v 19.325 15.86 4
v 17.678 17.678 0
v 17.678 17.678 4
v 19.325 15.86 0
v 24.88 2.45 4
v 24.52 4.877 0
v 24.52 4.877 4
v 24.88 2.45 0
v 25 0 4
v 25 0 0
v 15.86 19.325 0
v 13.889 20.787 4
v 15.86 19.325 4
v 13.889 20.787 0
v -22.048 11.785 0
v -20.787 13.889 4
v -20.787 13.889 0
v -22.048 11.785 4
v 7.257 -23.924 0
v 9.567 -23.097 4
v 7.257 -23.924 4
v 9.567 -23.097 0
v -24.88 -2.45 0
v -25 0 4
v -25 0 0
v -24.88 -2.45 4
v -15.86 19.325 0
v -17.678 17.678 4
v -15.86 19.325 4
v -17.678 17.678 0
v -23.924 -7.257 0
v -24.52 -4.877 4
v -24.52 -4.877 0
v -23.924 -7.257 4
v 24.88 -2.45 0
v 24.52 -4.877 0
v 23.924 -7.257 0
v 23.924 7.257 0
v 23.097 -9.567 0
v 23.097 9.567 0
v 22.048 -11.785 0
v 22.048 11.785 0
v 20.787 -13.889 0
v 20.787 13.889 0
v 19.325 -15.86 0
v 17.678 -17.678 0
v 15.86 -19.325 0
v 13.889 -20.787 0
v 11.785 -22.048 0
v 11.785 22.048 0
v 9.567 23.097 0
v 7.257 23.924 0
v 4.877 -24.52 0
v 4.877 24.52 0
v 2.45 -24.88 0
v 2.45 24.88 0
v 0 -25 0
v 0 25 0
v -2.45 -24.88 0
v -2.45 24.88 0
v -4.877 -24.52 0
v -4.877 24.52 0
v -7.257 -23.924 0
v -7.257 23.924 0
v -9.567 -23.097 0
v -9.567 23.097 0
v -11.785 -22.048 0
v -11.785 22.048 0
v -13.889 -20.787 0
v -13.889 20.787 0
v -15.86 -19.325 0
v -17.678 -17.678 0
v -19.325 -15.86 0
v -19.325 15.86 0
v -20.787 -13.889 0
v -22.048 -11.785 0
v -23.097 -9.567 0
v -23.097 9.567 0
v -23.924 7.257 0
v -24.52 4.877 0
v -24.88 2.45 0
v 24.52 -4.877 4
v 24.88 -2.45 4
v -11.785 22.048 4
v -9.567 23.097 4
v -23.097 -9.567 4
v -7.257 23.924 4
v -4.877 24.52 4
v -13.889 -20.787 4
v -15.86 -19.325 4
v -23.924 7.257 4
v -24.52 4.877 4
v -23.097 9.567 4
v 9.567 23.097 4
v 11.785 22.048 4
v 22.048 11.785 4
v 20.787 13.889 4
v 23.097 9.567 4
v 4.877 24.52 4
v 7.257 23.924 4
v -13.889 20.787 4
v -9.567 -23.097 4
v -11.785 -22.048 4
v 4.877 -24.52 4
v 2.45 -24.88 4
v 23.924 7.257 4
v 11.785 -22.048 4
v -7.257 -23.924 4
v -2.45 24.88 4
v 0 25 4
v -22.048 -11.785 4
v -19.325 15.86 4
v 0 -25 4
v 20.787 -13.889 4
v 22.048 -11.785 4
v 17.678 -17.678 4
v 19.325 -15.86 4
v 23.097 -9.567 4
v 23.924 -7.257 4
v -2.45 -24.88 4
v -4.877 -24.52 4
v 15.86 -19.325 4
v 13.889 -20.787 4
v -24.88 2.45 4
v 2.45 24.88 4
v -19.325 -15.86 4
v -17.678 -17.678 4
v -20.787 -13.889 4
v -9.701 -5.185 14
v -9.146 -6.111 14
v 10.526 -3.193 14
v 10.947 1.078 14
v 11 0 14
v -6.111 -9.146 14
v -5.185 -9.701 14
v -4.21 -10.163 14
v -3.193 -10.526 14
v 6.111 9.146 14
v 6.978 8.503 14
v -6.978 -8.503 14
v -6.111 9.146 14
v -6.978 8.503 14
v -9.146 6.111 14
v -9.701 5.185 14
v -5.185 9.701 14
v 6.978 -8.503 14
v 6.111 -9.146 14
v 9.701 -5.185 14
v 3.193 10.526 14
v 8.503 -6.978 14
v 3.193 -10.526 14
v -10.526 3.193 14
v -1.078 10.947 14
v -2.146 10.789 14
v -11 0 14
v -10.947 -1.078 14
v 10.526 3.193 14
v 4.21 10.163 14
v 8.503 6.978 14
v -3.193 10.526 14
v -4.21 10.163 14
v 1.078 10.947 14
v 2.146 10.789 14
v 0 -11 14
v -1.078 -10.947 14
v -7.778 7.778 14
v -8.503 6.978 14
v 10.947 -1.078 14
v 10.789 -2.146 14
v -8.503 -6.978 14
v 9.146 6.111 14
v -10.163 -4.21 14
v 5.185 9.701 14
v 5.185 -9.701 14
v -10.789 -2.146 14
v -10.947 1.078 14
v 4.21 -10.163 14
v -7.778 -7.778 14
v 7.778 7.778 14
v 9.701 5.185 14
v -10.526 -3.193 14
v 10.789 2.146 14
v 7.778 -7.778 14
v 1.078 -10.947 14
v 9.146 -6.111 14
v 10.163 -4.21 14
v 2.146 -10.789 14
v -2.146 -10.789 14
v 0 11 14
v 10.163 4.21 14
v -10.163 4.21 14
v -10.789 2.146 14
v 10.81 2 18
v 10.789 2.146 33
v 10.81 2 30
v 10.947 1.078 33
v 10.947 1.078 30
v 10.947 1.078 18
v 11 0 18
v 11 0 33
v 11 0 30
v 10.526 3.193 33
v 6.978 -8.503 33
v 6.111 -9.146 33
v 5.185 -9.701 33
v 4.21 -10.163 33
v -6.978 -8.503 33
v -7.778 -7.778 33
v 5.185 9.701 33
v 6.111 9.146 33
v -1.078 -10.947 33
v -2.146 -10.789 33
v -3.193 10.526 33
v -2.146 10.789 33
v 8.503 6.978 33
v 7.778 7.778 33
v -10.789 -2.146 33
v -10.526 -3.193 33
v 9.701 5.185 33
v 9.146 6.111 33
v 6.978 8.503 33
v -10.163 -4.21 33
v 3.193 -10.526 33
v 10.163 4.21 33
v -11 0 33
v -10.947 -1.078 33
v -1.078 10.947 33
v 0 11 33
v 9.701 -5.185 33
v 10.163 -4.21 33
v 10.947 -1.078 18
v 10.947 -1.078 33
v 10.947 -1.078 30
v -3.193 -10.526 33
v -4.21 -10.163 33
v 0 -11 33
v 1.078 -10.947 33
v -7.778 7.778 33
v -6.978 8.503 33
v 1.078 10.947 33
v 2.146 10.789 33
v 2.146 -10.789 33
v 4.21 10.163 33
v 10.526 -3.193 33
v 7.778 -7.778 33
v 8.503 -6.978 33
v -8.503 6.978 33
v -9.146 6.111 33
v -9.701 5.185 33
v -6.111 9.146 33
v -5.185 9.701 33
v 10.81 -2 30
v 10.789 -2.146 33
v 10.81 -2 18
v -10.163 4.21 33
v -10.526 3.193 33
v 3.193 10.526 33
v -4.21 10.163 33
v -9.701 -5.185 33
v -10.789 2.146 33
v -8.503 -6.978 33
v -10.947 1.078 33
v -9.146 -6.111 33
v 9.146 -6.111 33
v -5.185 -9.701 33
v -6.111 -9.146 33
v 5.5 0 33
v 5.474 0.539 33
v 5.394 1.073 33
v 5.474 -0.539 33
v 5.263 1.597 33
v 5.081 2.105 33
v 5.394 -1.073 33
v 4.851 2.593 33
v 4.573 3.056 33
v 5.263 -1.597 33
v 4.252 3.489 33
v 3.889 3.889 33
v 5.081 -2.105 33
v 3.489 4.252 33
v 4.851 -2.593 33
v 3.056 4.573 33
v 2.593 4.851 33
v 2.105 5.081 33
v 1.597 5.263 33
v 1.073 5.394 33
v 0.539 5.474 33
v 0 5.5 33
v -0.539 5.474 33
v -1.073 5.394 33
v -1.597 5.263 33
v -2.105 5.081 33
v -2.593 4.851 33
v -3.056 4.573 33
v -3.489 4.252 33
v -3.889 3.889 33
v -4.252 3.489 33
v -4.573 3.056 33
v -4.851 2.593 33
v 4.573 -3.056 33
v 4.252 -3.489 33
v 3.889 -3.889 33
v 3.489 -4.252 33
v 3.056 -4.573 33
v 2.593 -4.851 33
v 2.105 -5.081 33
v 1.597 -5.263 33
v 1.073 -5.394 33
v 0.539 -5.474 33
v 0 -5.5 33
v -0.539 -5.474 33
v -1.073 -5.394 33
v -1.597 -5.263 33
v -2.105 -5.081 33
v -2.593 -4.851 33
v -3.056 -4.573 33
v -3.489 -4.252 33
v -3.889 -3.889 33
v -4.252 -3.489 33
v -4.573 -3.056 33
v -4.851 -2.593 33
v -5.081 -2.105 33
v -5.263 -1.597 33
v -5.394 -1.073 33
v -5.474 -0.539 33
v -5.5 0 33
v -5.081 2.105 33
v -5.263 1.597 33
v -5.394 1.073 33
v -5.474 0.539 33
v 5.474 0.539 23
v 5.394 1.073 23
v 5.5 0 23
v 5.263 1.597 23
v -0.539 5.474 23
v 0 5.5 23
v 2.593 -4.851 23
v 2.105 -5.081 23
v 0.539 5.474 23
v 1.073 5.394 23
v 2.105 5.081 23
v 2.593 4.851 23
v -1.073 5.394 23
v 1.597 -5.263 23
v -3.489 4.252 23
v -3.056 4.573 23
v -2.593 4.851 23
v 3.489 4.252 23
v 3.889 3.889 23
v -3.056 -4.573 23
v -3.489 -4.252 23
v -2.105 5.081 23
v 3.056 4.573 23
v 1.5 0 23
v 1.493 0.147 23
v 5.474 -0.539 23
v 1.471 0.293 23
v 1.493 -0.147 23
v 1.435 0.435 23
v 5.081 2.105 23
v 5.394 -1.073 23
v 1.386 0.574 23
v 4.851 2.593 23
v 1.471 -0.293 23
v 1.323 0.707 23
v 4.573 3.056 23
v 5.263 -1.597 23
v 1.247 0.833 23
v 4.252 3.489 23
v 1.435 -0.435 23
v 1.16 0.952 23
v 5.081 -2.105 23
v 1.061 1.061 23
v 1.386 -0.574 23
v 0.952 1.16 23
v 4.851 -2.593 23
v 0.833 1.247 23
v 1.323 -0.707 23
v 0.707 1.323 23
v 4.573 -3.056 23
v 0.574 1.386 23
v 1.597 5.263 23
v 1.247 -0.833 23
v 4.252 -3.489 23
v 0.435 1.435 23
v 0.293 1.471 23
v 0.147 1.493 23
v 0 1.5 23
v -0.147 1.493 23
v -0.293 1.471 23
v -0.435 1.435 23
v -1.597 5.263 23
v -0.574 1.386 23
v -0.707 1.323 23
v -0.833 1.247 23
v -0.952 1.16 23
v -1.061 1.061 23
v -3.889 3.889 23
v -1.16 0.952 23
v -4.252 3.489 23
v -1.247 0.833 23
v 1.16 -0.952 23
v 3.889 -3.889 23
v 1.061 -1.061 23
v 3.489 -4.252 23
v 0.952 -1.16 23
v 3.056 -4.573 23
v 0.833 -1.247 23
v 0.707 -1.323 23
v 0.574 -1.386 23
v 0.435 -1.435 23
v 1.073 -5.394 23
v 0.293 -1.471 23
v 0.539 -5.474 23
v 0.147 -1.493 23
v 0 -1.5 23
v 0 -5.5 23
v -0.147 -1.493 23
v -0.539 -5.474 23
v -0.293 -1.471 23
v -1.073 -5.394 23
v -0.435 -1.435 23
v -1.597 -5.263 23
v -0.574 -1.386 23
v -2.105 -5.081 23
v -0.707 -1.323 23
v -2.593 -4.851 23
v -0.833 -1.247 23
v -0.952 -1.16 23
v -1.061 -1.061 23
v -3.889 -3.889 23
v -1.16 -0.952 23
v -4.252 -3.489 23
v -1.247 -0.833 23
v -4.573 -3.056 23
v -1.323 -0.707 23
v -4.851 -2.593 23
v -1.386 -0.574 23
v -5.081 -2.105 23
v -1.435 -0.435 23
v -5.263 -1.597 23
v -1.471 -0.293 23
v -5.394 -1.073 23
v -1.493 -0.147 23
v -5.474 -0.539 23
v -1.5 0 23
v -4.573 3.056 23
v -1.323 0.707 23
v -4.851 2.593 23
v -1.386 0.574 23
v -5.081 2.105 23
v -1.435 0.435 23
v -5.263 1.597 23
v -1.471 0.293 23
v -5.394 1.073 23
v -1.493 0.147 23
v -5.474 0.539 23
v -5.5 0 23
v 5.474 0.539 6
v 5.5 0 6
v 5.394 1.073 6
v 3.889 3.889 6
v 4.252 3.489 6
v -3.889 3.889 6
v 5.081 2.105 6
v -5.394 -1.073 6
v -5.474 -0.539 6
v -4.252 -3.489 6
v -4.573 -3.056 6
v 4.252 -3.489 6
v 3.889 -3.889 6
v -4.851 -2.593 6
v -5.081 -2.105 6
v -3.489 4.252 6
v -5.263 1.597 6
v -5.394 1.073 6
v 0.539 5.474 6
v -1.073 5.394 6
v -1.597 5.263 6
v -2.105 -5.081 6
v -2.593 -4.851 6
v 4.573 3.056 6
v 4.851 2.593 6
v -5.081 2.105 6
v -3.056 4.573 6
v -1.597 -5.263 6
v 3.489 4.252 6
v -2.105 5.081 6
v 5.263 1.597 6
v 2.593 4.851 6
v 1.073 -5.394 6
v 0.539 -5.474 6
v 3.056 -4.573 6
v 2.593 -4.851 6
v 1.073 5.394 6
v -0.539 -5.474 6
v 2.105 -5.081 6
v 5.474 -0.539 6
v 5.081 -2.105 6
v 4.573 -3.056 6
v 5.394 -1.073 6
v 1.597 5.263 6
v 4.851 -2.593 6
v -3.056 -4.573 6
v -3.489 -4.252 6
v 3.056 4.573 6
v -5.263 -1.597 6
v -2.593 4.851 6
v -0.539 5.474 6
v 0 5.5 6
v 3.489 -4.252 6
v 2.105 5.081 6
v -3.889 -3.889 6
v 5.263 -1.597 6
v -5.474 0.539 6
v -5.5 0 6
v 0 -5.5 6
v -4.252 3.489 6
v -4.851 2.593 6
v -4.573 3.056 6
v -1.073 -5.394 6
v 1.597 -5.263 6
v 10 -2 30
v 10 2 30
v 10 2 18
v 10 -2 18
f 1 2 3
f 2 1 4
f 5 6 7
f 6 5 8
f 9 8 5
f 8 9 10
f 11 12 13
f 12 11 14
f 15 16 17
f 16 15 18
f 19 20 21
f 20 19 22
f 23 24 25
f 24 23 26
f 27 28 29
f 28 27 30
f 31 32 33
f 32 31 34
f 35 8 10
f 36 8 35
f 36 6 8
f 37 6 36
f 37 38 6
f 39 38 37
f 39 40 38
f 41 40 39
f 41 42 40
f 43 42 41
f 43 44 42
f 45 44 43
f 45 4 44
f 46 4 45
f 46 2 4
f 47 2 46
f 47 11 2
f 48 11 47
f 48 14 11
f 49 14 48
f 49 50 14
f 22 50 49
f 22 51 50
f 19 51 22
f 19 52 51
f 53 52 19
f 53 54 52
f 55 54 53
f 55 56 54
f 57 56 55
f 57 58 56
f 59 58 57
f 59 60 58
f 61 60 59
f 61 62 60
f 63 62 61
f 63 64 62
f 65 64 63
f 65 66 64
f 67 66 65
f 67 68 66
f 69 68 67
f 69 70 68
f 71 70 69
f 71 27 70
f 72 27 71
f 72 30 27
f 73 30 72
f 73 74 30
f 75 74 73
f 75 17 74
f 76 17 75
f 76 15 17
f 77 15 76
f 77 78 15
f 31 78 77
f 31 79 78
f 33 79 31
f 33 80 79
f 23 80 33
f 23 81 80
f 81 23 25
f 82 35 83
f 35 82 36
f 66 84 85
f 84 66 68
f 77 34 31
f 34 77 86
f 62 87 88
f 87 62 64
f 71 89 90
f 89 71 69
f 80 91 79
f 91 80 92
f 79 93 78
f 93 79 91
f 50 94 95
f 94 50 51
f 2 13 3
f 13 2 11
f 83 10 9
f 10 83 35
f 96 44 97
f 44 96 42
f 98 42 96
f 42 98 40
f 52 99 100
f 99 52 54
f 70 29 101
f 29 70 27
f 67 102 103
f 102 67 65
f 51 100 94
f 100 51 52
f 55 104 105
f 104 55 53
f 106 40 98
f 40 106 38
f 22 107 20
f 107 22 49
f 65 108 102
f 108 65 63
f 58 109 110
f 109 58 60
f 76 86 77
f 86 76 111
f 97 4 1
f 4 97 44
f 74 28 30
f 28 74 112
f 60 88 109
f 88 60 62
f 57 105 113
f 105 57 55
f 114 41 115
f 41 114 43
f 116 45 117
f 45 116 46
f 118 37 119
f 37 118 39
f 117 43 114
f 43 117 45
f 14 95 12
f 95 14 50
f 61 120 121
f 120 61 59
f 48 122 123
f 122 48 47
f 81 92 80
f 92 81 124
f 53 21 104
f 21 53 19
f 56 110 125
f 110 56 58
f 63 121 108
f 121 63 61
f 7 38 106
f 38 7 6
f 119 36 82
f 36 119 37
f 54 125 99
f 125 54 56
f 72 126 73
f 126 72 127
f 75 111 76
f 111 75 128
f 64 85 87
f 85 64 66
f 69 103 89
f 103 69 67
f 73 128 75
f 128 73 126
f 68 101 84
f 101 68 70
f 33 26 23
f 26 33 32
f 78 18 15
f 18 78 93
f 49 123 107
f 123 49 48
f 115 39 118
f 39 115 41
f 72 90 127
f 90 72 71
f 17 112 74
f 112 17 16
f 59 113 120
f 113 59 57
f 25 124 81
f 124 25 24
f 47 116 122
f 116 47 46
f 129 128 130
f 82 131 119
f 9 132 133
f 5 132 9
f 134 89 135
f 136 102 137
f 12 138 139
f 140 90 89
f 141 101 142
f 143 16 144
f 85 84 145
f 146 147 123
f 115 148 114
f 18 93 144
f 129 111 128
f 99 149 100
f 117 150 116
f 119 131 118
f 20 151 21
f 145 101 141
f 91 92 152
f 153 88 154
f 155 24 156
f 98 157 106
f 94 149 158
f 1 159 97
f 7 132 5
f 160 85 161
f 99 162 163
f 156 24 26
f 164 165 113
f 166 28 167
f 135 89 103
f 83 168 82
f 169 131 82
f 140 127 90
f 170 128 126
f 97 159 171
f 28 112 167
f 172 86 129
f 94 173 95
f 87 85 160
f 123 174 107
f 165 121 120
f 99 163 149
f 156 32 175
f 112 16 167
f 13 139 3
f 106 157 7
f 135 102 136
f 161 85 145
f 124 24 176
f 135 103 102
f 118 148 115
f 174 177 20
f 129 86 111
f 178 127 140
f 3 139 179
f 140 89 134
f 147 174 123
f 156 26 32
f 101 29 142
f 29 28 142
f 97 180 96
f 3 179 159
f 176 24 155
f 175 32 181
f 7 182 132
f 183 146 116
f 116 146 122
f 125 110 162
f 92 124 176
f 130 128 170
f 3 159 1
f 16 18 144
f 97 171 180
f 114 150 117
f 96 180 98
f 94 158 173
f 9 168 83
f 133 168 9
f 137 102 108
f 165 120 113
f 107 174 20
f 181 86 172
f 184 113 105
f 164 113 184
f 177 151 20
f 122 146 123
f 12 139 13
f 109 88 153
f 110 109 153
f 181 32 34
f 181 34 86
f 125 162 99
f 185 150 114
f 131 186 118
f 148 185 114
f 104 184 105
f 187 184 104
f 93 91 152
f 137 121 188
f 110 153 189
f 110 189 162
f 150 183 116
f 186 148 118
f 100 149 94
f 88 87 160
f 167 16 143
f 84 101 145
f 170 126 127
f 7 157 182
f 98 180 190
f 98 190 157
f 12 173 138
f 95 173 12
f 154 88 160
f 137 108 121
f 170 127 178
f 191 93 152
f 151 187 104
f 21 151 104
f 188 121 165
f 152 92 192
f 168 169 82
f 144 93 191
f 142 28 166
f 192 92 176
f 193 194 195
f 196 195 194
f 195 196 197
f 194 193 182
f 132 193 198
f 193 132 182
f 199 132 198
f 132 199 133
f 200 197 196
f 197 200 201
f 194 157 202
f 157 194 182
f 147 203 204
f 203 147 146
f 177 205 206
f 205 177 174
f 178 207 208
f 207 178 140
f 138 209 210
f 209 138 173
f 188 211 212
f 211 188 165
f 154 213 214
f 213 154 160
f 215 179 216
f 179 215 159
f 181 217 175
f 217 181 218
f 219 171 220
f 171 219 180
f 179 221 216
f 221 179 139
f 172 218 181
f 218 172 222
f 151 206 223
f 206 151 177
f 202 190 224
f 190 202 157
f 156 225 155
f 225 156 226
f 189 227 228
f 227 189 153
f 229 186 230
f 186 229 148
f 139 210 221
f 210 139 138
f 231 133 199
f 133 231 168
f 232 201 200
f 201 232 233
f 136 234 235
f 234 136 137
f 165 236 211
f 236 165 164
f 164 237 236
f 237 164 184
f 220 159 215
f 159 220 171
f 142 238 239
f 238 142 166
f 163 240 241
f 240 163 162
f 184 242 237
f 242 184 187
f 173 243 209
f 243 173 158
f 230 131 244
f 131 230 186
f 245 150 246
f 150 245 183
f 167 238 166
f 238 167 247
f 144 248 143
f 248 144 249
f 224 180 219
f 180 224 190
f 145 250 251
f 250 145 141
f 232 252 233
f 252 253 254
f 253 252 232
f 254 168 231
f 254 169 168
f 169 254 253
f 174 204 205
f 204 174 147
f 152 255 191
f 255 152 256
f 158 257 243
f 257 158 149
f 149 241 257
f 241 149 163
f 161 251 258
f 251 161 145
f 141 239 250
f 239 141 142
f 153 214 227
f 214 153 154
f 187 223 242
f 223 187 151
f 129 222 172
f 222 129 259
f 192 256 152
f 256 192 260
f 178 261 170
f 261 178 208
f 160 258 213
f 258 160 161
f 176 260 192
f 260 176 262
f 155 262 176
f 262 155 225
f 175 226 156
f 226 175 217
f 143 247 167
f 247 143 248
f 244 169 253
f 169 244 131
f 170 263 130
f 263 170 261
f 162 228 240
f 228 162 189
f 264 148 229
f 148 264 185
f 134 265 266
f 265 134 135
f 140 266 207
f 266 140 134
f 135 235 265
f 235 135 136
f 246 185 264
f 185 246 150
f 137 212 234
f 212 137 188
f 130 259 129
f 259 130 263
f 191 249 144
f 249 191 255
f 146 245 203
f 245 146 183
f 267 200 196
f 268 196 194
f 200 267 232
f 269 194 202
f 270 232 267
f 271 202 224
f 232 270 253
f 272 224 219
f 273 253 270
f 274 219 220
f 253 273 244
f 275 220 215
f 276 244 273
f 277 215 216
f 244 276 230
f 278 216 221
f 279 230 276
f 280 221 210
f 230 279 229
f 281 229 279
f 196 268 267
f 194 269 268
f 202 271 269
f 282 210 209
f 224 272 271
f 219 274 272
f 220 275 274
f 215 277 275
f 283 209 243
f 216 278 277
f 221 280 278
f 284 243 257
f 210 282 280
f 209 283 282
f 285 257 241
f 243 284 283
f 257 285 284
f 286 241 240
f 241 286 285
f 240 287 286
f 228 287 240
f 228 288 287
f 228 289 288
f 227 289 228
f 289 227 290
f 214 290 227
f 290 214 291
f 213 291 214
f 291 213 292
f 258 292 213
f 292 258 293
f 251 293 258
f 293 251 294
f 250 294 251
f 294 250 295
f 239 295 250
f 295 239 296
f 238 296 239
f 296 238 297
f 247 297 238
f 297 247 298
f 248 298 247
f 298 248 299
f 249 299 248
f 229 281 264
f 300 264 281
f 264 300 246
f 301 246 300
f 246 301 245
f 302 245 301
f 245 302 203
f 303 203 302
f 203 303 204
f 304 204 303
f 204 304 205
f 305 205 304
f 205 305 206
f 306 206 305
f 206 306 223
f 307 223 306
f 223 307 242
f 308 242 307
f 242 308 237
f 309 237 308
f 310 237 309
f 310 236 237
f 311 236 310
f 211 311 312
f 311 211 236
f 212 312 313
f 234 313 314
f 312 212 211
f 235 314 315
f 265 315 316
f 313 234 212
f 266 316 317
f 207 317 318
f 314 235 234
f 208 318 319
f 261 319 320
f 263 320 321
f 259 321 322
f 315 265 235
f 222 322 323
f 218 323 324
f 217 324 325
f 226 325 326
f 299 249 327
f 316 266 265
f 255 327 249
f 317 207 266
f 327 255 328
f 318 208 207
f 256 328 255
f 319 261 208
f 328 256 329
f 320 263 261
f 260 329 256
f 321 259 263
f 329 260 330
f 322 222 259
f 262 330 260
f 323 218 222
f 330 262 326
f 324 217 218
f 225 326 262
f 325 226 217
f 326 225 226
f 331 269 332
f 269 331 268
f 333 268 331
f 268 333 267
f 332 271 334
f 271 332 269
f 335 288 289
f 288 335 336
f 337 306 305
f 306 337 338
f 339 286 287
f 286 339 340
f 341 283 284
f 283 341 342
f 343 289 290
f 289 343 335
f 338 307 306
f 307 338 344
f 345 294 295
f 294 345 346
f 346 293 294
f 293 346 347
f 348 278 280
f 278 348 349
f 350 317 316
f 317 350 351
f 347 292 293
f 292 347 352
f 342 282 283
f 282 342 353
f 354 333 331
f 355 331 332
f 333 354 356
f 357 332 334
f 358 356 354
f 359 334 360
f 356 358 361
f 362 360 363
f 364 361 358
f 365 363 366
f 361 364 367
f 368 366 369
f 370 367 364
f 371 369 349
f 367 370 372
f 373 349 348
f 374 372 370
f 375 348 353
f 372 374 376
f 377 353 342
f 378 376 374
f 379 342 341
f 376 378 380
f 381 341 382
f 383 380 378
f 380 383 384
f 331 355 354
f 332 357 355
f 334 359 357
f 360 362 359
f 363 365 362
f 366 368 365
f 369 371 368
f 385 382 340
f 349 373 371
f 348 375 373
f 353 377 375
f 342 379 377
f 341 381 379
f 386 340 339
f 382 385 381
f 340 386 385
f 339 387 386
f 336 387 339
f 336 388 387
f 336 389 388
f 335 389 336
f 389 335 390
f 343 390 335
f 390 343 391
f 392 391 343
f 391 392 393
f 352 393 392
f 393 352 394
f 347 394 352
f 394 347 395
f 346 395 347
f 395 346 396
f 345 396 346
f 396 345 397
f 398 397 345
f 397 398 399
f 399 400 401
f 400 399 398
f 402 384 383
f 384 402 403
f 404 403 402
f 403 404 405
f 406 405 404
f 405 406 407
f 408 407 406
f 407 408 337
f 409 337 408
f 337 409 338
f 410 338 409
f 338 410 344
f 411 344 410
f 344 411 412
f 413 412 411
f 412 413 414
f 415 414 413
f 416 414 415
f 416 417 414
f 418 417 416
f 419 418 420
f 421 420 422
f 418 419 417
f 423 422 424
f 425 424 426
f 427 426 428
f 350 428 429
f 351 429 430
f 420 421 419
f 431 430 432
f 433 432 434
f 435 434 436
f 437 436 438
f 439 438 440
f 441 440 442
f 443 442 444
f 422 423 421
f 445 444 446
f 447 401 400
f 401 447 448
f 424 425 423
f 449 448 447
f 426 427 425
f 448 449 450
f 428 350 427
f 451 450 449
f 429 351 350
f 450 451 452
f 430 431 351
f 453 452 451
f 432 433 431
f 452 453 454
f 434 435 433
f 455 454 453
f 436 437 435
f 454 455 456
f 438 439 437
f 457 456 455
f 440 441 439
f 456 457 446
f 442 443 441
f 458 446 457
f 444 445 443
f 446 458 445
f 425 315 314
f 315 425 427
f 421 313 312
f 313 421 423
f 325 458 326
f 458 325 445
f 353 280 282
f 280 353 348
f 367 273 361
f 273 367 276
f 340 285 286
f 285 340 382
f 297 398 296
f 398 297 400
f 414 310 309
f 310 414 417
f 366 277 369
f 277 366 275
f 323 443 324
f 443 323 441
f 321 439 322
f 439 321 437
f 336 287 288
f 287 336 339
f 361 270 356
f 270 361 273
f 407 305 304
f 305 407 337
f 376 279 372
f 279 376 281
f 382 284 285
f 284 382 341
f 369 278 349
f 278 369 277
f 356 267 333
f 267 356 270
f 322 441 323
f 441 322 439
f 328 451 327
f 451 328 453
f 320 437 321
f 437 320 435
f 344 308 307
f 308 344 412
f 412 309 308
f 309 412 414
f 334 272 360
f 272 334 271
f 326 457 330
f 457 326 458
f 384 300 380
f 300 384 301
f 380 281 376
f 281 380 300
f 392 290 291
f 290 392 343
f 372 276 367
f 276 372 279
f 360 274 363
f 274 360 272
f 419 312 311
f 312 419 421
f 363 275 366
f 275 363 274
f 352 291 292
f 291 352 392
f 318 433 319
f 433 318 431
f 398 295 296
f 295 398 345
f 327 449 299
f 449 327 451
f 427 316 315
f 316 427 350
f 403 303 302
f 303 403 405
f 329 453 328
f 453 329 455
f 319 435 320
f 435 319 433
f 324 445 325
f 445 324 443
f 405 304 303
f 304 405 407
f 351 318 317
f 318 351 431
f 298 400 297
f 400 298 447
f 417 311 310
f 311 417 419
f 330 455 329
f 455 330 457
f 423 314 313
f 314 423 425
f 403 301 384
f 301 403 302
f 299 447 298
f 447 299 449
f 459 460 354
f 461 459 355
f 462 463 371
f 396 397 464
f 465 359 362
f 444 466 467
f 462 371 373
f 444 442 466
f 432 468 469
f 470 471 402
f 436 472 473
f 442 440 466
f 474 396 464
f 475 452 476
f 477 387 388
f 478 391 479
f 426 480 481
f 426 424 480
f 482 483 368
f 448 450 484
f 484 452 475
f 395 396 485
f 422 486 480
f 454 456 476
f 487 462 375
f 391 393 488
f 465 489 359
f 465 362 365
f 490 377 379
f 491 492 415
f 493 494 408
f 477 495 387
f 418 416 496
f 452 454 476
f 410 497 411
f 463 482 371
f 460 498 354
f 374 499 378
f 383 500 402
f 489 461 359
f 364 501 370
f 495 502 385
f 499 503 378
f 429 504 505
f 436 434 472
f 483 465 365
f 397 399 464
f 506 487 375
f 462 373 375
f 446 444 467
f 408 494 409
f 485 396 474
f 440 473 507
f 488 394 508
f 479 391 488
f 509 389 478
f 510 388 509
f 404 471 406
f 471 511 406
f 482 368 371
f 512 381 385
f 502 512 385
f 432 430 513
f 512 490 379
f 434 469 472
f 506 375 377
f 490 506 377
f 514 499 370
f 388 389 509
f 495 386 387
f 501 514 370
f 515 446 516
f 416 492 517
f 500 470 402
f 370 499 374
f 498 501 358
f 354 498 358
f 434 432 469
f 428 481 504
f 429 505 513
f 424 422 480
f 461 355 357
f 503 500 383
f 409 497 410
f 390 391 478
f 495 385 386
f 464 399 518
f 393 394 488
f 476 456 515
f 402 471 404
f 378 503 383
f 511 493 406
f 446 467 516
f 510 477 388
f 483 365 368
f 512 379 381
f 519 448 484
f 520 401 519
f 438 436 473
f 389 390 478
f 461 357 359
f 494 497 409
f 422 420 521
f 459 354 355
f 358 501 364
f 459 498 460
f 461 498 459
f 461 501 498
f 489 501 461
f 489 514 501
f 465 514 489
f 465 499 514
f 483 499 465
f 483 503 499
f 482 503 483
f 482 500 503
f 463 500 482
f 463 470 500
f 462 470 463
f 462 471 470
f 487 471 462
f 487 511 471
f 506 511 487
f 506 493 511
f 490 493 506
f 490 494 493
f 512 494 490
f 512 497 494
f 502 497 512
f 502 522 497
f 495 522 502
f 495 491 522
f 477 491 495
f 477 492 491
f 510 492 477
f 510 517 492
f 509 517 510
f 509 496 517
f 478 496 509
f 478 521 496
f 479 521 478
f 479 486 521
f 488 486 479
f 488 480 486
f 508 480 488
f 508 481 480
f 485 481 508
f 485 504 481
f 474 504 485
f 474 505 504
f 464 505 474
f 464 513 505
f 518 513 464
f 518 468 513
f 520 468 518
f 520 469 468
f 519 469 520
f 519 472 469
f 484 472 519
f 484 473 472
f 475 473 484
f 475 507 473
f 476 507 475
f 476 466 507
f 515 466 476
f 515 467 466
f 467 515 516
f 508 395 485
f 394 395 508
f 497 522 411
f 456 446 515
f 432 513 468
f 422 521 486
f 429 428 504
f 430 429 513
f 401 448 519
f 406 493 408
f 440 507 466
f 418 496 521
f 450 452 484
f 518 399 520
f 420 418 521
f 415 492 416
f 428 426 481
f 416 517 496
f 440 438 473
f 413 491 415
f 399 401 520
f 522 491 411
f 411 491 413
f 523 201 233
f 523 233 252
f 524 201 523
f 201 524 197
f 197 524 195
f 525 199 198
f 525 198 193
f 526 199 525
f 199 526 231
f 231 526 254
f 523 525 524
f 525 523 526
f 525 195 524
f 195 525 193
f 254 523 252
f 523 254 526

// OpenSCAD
// 1.5 mL microcentrifuge tube stand for an analytical balance
// Printed standing up: rests on XY plane at z = 0, builds upward (+Z), centred on origin.

$fn = 64;

// ---- Overall body dimensions (mm) ----
base_d     = 50;   // base disc diameter
base_h     = 4;    // base disc height (z = 0 .. 4)
cone_top_d = 22;   // cone narrows to this diameter at z = 14
cone_h     = 10;   // cone height (z = 4 .. 14)
col_d      = 22;   // column diameter
col_h      = 19;   // column height (z = 14 .. 33)
top_z      = 33;   // top of the stand

// ---- Tube seat (bore) dimensions ----
seat_d = 11;       // seat bore diameter (z = 33 .. 23)
seat_h = 10;       // seat bore height (z = 23 .. 33)
tip_d  = 3;        // cone bore narrows to this at z = 6
tip_h  = 17;       // cone bore height (z = 6 .. 23)

// ---- Viewing window dimensions ----
win_w  = 4;        // window width in Y
win_z0 = 18;       // window bottom z
win_z1 = 30;       // window top z
win_h  = win_z1 - win_z0;

// ---- Build the solid body (base + cone + column) ----
module body() { union() {
    // base disc
    translate([0, 0, 0])
        cylinder(h = base_h, d = base_d);

    // cone narrowing from base_d to cone_top_d
    translate([0, 0, base_h])
        cylinder(h = cone_h, d1 = base_d, d2 = cone_top_d);

    // column
    translate([0, 0, base_h + cone_h])
        cylinder(h = col_h, d = col_d);
} }

// ---- Tube seat bore (cylinder + cone), extended 1 mm past the top ----
module seat() { union() {
    // seat cylinder: z = 23 .. 34 (1 mm past top at 33)
    translate([0, 0, 23])
        cylinder(h = 11, d = seat_d);

    // cone: z = 6 .. 23, narrowing from seat_d to tip_d
    translate([0, 0, 6])
        cylinder(h = tip_h, d1 = seat_d, d2 = tip_d);
} }

// ---- Viewing window: straight through the +X column wall, from the seat to the outside ----
// Box starts 1 mm inside the column outer wall (x = 10) and extends past it (to x = 12),
// so it removes only the +X wall and does not reach the seat bore (which ends at x = 5.5).
// This keeps the bore centred and the window a clean slot through the wall.
module window() { translate([10, -win_w / 2, win_z0])
    cube([2, win_w, win_h]); }

// ---- Final part: body minus seat bore minus viewing window ----
difference() {
    body();
    seat();
    window();
}
